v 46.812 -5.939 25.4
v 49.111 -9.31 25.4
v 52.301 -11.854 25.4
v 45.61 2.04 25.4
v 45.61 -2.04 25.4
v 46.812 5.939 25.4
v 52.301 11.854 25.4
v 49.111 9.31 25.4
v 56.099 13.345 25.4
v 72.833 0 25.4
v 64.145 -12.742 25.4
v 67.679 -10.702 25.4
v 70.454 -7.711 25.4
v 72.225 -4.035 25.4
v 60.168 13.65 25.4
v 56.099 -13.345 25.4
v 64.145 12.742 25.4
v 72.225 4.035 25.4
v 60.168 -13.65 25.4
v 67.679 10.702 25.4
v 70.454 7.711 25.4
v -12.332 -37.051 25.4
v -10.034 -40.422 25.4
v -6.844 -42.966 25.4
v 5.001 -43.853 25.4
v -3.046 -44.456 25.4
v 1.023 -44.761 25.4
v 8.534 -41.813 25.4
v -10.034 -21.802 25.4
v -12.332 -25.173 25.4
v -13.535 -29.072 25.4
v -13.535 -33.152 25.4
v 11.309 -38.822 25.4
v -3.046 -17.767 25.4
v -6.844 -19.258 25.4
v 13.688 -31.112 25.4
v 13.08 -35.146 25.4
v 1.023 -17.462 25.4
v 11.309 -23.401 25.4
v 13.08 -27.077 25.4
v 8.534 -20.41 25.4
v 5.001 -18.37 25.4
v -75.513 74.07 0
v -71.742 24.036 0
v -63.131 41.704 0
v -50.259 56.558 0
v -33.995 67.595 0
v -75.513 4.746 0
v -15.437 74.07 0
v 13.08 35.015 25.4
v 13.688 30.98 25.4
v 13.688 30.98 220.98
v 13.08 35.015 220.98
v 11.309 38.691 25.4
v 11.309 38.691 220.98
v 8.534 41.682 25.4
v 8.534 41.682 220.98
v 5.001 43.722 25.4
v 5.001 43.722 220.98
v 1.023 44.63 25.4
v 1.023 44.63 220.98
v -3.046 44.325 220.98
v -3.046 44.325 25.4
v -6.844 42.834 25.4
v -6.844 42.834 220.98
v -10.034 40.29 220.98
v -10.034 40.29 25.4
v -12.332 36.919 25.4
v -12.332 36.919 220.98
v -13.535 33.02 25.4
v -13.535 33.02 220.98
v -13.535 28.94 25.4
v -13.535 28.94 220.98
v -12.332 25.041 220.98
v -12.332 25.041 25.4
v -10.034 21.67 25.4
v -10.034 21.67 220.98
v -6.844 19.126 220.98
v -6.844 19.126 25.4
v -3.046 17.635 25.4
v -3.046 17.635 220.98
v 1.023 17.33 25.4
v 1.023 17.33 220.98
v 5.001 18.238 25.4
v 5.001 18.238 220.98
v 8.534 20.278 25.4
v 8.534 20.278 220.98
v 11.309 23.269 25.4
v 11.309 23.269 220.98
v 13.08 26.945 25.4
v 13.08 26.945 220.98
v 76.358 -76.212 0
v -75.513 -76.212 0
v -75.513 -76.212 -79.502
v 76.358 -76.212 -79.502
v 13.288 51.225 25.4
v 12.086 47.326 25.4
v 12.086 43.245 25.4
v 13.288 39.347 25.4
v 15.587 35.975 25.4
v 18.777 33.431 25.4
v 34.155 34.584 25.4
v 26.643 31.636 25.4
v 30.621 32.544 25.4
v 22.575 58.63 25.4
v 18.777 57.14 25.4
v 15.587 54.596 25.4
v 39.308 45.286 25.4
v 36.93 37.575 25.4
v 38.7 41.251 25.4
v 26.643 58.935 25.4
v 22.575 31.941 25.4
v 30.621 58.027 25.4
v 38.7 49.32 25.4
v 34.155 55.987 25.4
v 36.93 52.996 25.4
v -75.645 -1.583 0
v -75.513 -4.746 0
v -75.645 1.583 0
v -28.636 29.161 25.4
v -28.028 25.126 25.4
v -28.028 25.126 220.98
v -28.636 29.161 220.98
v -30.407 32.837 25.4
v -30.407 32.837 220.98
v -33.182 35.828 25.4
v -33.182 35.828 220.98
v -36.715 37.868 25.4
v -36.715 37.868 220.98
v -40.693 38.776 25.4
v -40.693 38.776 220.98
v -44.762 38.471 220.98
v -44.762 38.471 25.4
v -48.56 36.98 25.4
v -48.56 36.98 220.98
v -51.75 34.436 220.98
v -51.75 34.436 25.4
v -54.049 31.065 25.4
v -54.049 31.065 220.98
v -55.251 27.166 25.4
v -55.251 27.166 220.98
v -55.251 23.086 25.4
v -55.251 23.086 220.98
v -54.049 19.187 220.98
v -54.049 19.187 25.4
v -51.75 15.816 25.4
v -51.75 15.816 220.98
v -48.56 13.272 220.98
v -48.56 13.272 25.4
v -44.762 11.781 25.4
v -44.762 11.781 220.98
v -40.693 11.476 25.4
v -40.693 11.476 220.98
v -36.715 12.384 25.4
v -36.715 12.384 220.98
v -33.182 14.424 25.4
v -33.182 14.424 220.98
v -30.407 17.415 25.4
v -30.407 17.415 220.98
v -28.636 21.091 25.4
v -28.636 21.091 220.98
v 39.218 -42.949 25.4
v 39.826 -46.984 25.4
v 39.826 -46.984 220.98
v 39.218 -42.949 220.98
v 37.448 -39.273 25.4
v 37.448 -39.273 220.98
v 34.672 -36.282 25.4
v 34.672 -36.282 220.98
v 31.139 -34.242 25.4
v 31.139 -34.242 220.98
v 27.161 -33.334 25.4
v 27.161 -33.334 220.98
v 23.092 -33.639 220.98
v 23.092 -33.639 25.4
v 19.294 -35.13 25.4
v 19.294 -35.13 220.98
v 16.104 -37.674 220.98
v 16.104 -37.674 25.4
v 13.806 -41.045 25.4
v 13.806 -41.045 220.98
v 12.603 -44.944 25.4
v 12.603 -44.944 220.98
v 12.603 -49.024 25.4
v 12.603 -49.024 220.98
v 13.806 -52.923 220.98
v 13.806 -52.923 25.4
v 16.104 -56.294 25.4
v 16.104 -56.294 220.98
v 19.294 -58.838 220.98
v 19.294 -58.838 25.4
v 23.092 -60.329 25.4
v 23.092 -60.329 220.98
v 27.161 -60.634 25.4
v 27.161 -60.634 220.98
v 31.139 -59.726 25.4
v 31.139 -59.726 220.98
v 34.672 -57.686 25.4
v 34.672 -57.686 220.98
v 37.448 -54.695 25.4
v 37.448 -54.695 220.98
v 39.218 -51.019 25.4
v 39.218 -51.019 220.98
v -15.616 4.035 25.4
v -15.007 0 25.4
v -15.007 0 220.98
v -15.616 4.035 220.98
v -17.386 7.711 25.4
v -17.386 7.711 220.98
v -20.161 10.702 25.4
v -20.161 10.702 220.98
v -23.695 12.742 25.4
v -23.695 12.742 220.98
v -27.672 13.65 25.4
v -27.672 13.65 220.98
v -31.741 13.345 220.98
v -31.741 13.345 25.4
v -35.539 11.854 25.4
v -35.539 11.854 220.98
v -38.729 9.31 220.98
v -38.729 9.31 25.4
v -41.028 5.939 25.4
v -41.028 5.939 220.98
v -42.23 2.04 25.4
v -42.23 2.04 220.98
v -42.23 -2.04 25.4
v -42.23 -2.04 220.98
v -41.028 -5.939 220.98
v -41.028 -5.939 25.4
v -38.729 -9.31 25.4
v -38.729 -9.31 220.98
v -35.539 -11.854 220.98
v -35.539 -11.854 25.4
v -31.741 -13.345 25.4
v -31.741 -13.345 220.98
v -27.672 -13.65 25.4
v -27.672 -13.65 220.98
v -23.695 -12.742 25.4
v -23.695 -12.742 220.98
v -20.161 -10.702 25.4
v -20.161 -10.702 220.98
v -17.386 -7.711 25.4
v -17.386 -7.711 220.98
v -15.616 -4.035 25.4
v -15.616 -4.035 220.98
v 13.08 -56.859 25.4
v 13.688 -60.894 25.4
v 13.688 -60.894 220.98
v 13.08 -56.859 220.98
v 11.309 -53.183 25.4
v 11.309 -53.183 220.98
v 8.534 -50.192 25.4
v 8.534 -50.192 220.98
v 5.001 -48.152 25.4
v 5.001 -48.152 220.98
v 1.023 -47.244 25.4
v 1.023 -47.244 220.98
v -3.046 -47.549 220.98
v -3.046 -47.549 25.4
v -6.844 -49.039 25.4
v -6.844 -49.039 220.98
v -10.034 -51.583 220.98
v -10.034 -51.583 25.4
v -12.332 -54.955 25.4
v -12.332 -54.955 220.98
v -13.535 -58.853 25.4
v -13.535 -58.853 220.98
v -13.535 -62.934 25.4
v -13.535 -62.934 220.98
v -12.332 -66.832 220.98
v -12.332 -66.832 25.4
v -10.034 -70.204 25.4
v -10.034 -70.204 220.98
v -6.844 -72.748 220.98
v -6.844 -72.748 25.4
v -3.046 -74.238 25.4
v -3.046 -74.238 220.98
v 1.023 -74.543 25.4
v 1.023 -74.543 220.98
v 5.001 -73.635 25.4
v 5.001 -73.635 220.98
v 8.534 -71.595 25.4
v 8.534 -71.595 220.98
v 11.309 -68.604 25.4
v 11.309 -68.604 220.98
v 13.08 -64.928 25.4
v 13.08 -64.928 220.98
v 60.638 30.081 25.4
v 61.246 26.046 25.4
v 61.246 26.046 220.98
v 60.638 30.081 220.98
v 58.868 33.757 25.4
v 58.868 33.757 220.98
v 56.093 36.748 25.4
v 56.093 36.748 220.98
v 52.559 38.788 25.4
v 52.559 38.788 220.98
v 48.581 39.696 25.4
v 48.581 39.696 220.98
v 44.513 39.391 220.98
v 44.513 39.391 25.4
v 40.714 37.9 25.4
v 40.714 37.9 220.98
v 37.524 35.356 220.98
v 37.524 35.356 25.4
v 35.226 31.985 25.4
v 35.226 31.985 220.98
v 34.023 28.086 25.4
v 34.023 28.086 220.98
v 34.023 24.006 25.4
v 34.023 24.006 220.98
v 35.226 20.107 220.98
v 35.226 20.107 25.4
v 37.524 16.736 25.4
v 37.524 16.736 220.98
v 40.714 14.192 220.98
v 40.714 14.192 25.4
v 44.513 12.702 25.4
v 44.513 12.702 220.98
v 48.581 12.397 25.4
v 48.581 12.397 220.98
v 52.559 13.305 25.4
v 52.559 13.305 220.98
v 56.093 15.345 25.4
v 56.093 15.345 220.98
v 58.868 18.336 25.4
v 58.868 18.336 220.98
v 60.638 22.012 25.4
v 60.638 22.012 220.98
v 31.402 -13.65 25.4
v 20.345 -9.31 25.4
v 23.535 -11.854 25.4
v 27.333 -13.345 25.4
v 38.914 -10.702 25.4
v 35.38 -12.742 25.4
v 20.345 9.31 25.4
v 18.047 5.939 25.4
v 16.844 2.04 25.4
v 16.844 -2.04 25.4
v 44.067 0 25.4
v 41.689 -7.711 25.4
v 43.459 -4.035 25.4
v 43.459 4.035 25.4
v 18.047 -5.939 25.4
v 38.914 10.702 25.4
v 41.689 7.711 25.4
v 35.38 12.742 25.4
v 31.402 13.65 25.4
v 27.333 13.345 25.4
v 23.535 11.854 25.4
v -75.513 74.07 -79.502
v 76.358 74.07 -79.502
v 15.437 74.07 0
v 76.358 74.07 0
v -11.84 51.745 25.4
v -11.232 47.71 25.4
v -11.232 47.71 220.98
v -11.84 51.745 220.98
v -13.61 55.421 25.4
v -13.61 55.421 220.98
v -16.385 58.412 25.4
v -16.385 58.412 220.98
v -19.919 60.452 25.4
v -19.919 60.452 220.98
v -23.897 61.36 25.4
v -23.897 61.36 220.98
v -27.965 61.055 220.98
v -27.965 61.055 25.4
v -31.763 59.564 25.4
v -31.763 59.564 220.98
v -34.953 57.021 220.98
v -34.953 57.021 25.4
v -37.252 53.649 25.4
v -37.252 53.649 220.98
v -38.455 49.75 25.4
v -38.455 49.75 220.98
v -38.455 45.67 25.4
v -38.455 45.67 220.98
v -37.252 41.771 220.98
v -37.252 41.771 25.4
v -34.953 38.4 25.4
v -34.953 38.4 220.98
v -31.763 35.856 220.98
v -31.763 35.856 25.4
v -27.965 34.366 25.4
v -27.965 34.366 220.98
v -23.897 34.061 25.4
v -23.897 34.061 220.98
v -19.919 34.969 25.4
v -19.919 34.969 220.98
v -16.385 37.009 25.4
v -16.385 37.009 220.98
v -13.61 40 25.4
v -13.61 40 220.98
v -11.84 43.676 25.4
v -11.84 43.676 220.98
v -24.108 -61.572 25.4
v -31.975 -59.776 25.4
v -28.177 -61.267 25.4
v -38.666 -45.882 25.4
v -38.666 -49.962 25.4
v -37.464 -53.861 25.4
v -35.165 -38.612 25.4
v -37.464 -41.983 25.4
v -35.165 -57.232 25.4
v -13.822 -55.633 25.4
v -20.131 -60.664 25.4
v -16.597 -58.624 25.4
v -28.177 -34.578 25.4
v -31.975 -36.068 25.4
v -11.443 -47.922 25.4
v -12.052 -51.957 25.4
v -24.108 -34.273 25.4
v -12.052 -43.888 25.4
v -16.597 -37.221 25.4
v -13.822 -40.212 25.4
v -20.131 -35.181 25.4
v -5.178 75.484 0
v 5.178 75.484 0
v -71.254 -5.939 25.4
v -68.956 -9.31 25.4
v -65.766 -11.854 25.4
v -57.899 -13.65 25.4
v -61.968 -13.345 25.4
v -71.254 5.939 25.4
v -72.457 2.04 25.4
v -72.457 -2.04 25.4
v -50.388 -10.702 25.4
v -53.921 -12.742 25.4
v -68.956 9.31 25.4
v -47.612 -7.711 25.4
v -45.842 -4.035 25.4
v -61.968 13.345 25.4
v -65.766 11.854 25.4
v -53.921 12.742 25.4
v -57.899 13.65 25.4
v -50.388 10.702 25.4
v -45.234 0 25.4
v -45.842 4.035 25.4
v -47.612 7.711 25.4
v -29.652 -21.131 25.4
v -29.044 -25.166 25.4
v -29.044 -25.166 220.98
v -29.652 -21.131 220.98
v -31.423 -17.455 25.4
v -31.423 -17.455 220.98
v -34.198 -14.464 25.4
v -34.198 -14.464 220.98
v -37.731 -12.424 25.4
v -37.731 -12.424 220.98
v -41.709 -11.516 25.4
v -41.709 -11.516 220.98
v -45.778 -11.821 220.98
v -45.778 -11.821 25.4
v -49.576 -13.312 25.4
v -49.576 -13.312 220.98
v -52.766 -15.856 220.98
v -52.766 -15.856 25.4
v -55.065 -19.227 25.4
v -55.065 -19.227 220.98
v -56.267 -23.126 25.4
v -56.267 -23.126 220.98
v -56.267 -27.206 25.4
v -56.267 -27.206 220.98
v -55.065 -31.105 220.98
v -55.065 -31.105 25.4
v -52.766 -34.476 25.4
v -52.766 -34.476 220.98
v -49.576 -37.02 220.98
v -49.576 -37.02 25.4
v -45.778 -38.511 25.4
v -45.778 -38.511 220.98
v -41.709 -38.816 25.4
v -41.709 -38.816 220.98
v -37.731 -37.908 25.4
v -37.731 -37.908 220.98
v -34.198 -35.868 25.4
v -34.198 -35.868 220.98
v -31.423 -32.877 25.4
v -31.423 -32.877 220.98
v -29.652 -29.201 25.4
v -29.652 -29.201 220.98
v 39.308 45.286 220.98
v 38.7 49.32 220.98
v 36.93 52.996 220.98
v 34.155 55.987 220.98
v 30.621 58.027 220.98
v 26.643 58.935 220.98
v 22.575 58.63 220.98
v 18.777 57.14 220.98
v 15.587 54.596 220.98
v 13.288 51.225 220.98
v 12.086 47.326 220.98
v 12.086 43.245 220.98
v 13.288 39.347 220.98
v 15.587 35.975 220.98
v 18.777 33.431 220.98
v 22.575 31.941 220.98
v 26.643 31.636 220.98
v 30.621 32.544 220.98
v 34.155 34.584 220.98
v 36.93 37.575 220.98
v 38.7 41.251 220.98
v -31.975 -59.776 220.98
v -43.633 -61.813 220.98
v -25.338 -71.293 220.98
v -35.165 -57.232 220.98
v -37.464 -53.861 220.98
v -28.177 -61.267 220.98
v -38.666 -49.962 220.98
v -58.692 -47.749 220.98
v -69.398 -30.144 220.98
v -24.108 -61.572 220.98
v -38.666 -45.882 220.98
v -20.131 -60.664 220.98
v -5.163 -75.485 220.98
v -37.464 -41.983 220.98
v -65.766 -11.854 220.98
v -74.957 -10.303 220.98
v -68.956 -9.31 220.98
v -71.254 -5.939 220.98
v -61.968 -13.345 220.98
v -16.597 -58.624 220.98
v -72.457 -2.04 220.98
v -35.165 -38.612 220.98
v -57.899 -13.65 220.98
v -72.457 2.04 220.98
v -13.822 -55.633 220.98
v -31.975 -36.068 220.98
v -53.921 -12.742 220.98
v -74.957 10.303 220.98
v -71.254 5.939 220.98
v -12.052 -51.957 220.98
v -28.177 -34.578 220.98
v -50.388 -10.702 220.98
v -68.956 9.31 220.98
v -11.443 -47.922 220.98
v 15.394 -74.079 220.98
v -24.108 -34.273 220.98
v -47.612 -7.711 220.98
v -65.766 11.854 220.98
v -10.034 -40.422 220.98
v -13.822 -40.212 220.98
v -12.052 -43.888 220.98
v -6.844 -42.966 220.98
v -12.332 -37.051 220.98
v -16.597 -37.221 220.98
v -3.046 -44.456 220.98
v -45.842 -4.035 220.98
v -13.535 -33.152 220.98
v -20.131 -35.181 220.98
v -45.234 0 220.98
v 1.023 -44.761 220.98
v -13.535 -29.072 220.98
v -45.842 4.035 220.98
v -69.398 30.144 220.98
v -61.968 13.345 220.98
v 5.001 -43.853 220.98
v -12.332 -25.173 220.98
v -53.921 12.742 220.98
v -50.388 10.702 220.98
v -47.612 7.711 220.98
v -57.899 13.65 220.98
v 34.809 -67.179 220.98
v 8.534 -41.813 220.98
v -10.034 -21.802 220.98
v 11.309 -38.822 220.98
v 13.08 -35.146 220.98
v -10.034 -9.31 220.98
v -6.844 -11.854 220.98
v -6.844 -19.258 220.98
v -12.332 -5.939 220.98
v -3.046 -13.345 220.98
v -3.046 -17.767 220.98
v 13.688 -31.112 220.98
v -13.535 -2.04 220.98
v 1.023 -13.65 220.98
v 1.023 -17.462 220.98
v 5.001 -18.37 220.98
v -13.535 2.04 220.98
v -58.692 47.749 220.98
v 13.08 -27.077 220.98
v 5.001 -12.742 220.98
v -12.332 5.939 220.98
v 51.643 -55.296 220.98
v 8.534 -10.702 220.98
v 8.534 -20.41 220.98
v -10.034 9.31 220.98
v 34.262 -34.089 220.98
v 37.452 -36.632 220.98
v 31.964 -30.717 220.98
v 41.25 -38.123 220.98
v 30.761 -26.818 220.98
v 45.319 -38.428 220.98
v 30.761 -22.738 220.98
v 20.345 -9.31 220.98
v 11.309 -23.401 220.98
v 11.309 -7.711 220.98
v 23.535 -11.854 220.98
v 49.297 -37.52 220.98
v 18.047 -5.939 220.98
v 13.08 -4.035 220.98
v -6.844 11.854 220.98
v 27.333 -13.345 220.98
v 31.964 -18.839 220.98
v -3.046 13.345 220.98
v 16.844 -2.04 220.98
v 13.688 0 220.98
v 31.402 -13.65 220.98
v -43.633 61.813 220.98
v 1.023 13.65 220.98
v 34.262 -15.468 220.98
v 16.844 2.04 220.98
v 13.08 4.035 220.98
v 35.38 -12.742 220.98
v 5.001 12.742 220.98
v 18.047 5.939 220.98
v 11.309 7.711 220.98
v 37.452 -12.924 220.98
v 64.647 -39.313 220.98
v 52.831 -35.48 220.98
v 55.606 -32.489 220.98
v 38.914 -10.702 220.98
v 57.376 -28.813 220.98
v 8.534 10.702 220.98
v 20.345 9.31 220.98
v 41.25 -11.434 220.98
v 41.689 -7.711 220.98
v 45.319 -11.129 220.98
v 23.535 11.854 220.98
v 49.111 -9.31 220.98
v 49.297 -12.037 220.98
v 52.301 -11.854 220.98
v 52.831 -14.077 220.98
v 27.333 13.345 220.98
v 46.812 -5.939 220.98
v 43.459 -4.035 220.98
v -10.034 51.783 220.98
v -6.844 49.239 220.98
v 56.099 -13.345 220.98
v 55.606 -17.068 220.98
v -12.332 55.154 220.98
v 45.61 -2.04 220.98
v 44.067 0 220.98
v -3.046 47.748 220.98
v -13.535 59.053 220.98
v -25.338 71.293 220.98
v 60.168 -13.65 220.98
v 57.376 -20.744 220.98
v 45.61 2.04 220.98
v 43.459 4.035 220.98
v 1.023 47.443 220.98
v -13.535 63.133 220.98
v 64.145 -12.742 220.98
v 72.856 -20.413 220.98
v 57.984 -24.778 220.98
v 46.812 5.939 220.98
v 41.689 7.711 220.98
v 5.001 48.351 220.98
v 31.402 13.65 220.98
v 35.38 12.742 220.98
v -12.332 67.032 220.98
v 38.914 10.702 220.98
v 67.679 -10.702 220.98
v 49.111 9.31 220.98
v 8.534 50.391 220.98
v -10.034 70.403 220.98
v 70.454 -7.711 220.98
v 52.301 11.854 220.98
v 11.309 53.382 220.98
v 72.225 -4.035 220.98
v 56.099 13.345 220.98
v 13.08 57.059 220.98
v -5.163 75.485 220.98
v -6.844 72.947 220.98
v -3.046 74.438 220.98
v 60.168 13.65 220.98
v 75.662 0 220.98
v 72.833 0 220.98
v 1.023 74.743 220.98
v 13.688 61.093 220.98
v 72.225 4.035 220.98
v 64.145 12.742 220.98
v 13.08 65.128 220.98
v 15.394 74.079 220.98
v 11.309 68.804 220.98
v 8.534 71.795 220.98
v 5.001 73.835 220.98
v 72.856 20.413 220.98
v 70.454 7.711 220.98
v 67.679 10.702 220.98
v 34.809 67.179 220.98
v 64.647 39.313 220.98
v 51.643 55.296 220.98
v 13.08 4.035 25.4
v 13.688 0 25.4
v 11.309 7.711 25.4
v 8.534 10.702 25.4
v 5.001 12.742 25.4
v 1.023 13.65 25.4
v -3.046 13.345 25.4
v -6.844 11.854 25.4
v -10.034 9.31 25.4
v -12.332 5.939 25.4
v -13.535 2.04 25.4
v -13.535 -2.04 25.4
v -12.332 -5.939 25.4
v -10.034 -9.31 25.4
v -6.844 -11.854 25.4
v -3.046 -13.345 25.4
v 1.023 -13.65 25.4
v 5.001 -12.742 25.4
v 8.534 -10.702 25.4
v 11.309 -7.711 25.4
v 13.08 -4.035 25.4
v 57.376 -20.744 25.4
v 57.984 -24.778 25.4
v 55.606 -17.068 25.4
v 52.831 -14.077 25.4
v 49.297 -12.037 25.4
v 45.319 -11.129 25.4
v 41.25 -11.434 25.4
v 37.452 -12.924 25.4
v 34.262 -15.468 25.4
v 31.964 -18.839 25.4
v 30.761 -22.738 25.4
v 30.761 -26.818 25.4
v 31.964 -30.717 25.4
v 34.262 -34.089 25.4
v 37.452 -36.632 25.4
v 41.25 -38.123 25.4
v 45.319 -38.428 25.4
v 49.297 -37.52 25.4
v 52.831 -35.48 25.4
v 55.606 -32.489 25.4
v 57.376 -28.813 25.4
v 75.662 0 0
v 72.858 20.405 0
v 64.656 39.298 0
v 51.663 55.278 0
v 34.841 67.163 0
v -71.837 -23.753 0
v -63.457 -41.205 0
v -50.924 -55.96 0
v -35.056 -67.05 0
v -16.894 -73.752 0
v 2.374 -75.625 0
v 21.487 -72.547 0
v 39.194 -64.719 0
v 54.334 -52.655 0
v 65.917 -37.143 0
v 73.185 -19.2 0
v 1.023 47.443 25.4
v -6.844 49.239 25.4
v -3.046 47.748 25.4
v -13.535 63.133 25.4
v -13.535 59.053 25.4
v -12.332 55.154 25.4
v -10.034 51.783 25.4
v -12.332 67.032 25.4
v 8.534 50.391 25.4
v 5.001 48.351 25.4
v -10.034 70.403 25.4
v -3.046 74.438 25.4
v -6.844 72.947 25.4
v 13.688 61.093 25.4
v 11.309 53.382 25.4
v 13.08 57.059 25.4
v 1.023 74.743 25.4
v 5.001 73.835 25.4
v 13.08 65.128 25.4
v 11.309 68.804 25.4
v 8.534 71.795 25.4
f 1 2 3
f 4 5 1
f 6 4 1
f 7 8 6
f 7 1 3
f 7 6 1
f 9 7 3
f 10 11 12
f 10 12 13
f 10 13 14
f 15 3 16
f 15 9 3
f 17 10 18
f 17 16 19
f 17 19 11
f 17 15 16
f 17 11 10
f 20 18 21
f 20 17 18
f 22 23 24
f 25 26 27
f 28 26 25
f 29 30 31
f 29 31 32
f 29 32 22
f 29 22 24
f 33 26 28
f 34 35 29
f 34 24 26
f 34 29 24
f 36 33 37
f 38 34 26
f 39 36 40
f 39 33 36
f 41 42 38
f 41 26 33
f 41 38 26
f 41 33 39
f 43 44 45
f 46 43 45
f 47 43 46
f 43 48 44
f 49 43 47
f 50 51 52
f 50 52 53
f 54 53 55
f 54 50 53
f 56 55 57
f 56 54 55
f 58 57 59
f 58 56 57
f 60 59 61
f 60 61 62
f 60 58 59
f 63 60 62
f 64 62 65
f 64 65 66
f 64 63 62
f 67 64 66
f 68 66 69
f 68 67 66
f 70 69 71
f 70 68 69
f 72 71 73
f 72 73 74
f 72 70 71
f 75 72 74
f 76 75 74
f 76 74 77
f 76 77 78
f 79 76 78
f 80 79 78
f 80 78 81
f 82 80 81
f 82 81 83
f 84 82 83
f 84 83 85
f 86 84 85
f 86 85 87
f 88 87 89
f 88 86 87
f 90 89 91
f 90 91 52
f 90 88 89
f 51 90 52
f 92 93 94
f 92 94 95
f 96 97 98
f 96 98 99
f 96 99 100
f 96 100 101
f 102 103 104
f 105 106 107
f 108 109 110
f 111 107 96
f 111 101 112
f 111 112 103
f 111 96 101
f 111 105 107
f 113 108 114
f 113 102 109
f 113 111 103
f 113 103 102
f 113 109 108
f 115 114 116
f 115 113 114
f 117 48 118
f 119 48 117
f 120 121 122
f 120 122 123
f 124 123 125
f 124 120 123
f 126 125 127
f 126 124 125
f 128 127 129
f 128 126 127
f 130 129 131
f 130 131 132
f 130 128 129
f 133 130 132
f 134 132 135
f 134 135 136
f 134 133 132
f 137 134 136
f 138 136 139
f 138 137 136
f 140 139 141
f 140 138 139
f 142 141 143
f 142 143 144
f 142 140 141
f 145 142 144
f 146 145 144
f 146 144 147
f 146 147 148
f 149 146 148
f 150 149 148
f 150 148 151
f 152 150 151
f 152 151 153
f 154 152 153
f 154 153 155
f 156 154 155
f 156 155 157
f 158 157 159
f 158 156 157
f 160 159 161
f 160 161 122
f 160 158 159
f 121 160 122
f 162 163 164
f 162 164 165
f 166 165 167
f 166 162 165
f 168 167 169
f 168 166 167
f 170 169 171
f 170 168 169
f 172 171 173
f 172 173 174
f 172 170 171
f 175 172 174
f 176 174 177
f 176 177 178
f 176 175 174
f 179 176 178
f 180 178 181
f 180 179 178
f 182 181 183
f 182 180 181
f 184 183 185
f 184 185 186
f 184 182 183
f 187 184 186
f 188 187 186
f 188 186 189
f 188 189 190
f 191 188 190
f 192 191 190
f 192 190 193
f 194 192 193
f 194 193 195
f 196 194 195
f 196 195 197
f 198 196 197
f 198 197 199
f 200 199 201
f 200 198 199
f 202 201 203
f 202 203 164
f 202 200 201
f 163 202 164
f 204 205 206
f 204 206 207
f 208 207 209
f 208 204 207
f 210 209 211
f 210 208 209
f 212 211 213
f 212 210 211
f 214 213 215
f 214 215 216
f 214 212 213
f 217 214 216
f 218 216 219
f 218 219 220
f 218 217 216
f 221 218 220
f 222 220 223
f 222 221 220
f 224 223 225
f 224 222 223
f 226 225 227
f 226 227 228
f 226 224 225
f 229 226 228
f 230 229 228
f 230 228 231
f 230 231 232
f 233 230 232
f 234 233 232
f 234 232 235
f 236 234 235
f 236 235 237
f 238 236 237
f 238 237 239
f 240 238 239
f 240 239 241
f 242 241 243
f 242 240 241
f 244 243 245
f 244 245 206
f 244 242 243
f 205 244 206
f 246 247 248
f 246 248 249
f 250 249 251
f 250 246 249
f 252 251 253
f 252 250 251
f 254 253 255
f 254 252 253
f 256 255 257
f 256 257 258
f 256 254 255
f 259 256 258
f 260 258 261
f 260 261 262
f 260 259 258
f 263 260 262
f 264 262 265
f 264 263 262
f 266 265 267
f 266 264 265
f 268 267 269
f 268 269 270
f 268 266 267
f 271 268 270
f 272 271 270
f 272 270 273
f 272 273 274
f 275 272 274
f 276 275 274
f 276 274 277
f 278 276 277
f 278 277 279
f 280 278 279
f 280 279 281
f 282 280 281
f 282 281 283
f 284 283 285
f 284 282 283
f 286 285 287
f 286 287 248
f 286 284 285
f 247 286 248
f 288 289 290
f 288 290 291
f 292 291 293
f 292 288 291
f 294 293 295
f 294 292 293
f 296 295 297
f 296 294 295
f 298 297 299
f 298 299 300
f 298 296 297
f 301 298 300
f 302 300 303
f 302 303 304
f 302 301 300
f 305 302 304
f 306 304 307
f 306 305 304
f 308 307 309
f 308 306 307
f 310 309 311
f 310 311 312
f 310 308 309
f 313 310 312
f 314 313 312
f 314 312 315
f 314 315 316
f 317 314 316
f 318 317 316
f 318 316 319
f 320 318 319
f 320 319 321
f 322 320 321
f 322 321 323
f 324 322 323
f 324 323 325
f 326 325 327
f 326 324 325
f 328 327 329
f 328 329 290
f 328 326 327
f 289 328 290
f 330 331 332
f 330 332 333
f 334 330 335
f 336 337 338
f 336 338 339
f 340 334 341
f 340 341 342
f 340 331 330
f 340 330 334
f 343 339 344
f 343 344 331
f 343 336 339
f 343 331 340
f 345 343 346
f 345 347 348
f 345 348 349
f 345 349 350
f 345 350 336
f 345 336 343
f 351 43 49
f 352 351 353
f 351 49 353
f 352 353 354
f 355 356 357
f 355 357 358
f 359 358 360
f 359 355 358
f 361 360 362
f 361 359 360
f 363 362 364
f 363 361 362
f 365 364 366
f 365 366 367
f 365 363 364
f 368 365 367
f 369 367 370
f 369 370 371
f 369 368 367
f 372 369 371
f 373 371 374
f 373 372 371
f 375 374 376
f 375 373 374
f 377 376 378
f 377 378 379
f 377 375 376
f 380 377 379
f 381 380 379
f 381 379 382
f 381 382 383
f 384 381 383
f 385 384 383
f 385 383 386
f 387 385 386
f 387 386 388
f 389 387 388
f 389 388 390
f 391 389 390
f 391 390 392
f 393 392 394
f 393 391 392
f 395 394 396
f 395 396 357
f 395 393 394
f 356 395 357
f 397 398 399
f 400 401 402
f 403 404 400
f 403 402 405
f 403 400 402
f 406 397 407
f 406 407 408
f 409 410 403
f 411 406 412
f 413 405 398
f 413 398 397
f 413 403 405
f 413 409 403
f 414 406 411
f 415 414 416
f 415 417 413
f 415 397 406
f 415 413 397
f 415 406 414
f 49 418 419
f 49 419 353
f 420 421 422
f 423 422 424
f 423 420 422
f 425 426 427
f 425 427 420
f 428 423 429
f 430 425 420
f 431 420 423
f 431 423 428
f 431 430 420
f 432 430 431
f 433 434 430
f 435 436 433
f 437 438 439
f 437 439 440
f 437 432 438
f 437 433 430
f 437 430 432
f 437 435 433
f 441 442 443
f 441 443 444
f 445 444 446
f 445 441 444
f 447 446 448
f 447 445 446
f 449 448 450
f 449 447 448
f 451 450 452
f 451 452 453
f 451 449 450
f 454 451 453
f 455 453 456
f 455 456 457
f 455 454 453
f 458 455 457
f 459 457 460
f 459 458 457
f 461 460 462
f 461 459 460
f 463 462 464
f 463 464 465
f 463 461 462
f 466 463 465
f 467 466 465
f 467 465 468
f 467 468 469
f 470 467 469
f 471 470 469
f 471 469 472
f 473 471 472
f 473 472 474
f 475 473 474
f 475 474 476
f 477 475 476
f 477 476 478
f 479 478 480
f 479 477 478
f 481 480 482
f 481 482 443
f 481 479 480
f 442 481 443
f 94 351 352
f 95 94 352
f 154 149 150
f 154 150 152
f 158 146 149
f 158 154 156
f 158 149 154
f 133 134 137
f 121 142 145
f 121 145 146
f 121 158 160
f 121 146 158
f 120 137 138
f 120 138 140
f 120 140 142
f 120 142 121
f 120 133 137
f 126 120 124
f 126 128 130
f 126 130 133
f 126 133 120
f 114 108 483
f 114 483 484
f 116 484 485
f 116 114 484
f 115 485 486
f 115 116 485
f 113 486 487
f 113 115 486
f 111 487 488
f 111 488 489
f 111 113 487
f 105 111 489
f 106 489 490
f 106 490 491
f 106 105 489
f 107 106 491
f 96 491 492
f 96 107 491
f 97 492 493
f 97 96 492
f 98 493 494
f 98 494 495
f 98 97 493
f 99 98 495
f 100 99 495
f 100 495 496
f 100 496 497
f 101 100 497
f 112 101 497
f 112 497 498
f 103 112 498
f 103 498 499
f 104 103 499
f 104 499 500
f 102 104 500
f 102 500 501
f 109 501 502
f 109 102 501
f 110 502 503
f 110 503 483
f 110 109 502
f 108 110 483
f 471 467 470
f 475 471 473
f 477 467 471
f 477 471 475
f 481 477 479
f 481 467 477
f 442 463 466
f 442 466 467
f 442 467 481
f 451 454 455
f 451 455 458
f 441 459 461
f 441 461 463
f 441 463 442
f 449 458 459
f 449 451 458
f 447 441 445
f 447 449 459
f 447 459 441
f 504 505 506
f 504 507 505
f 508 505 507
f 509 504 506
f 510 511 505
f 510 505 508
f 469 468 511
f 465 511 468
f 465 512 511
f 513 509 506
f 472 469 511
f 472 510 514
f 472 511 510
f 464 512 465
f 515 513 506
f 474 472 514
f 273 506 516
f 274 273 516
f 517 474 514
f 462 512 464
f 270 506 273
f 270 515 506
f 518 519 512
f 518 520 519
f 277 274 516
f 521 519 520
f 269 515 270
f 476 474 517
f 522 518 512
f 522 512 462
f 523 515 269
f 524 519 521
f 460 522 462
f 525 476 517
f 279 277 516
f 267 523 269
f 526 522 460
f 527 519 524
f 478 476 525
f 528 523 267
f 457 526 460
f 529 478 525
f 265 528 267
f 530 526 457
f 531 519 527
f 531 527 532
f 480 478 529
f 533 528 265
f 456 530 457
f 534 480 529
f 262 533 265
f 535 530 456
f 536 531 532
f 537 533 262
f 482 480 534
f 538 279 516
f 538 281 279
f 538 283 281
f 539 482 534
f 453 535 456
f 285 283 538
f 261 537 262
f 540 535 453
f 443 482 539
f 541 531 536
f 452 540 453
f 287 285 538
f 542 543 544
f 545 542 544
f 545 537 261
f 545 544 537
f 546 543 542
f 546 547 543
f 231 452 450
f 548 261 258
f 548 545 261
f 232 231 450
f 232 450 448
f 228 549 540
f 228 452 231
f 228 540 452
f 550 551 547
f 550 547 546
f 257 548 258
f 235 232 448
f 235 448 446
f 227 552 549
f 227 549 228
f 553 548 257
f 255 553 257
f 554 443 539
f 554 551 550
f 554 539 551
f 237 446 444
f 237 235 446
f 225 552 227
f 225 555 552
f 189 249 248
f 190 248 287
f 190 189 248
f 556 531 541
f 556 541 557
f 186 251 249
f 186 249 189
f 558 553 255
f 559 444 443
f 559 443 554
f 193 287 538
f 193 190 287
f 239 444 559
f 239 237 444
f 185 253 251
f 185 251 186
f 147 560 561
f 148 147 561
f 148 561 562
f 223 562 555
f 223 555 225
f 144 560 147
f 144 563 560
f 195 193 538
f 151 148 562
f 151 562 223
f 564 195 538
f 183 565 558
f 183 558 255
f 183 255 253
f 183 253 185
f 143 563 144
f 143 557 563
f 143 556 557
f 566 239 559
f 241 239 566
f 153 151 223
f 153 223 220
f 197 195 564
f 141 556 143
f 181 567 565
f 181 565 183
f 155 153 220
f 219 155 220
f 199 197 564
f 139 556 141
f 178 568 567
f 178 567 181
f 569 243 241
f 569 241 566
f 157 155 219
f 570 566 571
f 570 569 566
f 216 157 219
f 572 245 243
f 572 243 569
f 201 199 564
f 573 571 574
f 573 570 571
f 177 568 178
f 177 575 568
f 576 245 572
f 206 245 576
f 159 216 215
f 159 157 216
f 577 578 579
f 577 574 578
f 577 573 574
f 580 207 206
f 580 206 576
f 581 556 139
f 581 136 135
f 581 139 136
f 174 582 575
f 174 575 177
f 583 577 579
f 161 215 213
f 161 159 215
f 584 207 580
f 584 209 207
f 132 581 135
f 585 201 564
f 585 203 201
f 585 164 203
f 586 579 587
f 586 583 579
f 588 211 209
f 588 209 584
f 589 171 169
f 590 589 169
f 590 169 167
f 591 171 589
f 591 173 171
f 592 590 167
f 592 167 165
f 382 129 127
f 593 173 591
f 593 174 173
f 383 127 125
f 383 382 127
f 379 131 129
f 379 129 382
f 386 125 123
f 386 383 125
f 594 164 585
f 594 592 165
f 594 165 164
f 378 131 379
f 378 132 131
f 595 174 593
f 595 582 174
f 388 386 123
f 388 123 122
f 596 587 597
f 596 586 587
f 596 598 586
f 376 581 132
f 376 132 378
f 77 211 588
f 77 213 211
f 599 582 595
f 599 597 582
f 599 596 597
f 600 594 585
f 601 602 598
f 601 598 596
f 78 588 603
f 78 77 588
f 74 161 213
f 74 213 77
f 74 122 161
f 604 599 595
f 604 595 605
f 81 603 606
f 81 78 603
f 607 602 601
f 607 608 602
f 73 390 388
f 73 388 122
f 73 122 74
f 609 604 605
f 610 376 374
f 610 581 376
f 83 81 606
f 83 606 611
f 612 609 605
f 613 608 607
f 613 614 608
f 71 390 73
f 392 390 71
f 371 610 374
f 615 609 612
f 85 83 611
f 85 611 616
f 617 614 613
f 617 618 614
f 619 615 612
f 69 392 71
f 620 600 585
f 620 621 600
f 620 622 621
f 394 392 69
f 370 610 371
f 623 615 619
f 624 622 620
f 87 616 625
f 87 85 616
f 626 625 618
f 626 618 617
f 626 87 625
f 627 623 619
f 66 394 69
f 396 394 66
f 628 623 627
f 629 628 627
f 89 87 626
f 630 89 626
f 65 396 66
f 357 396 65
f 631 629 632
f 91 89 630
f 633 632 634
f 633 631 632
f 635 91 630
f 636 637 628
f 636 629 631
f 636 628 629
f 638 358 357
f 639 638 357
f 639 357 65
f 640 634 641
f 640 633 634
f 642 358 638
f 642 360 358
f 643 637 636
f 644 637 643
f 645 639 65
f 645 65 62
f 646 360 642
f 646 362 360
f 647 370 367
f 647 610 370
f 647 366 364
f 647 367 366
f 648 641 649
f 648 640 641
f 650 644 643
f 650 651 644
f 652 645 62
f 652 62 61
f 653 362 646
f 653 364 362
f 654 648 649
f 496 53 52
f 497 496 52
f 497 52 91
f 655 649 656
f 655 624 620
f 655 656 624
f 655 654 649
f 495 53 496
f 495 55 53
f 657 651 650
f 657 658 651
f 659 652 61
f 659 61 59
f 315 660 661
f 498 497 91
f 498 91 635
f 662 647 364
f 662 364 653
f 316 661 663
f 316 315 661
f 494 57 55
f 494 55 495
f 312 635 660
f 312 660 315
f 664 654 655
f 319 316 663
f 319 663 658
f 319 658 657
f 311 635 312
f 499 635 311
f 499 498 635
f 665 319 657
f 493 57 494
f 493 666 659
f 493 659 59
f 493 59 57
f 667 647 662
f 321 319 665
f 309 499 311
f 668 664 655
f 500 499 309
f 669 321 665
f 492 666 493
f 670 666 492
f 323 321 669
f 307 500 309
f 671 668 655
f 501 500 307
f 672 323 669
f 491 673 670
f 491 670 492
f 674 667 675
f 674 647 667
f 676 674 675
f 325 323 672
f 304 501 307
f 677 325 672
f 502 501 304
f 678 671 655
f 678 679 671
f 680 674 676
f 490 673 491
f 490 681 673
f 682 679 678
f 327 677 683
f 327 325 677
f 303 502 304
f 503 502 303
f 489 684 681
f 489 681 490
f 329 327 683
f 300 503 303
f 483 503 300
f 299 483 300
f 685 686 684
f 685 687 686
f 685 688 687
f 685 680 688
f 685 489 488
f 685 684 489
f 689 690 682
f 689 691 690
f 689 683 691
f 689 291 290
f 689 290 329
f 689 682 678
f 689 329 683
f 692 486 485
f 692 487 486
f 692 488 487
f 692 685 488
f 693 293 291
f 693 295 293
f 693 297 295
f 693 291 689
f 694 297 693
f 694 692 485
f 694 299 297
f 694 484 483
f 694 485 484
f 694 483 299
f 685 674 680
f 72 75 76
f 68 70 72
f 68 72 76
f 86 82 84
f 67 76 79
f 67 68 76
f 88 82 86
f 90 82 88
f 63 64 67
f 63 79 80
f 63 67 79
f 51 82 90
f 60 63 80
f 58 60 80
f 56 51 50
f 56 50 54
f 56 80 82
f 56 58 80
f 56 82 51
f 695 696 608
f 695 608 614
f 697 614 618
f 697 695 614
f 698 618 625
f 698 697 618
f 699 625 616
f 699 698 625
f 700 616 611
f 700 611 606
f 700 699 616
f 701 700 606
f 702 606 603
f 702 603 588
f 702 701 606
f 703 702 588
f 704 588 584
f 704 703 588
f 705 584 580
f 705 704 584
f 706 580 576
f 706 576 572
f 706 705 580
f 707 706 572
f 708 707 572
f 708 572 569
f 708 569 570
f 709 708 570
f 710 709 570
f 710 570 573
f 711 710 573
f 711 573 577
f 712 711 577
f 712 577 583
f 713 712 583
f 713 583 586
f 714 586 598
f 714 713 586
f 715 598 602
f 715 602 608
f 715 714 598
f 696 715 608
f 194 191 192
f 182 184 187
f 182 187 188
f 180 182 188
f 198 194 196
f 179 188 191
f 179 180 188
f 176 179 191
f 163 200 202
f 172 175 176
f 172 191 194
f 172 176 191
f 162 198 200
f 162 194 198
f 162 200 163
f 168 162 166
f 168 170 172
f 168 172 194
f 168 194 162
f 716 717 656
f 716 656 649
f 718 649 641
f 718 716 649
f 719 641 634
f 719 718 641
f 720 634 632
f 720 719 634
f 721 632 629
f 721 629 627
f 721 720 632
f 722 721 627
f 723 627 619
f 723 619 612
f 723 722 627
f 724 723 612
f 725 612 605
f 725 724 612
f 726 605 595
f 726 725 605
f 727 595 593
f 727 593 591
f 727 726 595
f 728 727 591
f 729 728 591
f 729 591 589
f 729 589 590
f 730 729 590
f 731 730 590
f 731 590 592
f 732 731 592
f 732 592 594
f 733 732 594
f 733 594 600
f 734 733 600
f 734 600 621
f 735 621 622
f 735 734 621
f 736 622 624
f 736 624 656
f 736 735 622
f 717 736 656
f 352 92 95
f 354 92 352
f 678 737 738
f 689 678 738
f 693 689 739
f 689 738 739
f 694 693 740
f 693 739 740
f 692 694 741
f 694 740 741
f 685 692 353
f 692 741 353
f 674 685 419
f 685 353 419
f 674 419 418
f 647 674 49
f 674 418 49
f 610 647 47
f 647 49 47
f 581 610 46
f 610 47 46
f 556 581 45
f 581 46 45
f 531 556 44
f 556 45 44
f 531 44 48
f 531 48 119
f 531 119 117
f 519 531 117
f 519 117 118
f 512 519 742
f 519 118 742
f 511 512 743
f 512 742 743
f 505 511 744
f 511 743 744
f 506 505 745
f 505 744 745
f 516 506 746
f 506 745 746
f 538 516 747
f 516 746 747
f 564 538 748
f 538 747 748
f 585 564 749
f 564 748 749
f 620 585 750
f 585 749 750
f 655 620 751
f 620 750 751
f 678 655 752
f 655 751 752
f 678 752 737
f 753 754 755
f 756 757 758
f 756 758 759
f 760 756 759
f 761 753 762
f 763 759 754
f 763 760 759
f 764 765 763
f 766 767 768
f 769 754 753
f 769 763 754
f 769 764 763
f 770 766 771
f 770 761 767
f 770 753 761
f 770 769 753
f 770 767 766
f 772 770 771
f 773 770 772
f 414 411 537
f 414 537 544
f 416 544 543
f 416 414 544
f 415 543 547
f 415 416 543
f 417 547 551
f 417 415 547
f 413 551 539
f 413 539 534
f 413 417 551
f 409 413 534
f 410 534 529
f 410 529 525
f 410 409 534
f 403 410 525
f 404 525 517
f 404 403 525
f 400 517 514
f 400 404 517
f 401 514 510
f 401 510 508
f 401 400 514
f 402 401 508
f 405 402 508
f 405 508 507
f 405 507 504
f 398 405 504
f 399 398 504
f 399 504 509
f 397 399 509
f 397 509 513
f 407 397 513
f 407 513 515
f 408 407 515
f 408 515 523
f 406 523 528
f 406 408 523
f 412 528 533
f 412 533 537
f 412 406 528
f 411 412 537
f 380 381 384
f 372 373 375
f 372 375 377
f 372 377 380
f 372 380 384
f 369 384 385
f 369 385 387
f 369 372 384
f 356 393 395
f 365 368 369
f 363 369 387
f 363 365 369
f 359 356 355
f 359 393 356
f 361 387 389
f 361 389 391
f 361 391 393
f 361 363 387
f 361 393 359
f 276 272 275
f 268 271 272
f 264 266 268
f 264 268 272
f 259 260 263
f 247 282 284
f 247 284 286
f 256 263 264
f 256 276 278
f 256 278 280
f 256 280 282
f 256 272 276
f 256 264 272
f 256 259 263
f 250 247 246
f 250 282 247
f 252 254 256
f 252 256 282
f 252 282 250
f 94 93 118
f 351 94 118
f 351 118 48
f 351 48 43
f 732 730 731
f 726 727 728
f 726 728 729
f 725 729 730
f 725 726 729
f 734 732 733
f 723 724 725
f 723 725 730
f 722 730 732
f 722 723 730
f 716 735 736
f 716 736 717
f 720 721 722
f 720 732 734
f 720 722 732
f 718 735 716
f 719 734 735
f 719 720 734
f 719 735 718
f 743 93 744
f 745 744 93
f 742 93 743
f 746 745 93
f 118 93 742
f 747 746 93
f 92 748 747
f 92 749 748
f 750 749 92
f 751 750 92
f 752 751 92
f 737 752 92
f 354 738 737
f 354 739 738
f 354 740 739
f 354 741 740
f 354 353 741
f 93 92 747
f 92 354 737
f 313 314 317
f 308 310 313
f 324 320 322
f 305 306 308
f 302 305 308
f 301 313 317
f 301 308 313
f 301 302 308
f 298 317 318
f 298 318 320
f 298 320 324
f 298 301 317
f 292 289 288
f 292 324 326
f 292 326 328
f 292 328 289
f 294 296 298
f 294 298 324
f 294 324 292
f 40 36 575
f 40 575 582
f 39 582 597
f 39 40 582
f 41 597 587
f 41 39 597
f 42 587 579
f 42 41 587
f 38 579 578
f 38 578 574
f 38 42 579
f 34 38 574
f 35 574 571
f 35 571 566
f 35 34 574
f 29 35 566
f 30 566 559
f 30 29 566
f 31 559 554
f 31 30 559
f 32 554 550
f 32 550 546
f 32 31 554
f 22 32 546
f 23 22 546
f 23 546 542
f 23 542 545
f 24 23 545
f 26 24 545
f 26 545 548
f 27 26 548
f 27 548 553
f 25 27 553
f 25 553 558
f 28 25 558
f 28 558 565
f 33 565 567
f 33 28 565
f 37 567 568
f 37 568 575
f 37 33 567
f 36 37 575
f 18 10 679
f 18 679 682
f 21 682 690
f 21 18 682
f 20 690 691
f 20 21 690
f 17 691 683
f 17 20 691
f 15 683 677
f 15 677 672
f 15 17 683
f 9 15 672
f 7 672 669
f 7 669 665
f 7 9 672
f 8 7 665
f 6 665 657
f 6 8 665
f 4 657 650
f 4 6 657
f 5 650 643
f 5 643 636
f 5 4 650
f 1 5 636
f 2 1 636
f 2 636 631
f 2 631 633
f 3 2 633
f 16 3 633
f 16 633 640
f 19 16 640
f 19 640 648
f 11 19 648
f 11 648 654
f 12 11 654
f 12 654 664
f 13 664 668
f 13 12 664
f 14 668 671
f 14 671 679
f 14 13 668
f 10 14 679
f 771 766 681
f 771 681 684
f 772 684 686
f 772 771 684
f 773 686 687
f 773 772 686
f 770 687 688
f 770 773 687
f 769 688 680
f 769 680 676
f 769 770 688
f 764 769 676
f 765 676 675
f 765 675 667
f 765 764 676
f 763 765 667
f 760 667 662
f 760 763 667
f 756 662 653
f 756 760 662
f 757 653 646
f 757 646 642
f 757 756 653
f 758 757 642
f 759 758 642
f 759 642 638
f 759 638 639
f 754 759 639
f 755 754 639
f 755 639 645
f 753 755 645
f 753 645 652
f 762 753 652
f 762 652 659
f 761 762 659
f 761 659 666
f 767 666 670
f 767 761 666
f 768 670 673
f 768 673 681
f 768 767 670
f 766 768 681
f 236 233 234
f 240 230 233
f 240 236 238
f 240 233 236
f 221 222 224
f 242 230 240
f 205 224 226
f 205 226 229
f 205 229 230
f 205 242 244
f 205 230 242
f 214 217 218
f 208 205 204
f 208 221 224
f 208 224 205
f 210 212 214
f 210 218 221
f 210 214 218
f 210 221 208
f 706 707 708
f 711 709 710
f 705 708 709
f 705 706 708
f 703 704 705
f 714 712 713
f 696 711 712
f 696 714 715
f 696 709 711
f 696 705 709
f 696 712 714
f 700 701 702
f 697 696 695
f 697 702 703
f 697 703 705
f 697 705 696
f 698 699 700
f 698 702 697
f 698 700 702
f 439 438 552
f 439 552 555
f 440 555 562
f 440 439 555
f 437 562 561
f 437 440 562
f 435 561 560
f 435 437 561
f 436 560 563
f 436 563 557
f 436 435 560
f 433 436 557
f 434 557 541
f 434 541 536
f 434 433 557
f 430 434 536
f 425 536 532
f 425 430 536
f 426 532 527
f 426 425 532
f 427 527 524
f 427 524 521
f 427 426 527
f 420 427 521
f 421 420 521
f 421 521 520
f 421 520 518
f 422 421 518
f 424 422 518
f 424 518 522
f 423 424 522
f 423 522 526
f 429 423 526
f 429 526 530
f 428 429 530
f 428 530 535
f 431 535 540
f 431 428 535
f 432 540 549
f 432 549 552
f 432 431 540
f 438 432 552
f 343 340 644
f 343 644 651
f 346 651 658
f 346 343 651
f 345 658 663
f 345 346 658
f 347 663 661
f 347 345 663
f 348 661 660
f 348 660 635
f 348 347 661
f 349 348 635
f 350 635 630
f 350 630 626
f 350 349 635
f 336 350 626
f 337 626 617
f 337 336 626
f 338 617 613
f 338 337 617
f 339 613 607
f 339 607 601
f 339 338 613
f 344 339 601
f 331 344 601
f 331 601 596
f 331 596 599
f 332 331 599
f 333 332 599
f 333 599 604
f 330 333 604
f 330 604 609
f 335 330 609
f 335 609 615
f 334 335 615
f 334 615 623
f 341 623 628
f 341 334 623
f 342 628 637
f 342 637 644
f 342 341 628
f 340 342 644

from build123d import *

# Parameters (mm, degrees)
F0_R     = 75.661837
F1_DEPTH = 25.4
F2_R     = 75.661837
F2_R_2   = 13.687901
F3_DEPTH = 195.58
F4_W     = 151.870482
F4_H     = 150.282562
F5_DEPTH = 79.502


with BuildPart() as f1:
    # F0 (on Top) → F1 (new body)
    with BuildSketch(Plane.XY):
        Circle(F0_R)
    extrude(amount=F1_DEPTH)

    # F2 (on face) → F3 (join)
    with BuildSketch(Plane.XY.offset(25.4)):
        Circle(F2_R)
        with Locations((-25.131308, -47.922332)):
            Circle(F2_R_2, mode=Mode.SUBTRACT)
        with Locations((-42.732153, -25.166063)):
            Circle(F2_R_2, mode=Mode.SUBTRACT)
        with Locations((0, -60.893506)):
            Circle(F2_R_2, mode=Mode.SUBTRACT)
        with Locations((26.138142, -46.983935)):
            Circle(F2_R_2, mode=Mode.SUBTRACT)
        with Locations((0, -31.111687)):
            Circle(F2_R_2, mode=Mode.SUBTRACT)
        with Locations((44.296265, -24.778374)):
            Circle(F2_R_2, mode=Mode.SUBTRACT)
        with Locations((-58.921885, 0)):
            Circle(F2_R_2, mode=Mode.SUBTRACT)
        with Locations((-41.716155, 25.125945)):
            Circle(F2_R_2, mode=Mode.SUBTRACT)
        with Locations((-28.695317, 0)):
            Circle(F2_R_2, mode=Mode.SUBTRACT)
        with Locations((-24.919521, 47.710422)):
            Circle(F2_R_2, mode=Mode.SUBTRACT)
        Circle(F2_R_2, mode=Mode.SUBTRACT)
        with Locations((30.379288, 0)):
            Circle(F2_R_2, mode=Mode.SUBTRACT)
        with Locations((0, 30.979946)):
            Circle(F2_R_2, mode=Mode.SUBTRACT)
        with Locations((59.144725, 0)):
            Circle(F2_R_2, mode=Mode.SUBTRACT)
        with Locations((47.558412, 26.046298)):
            Circle(F2_R_2, mode=Mode.SUBTRACT)
        with Locations((25.620574, 45.285549)):
            Circle(F2_R_2, mode=Mode.SUBTRACT)
        with Locations((0, 61.093103)):
            Circle(F2_R_2, mode=Mode.SUBTRACT)
    extrude(amount=F3_DEPTH)

    # F4 (on Top) → F5 (join)
    with BuildSketch(Plane.XY):
        with Locations((0.422429, -1.071021)):
            Rectangle(F4_W, F4_H)
    extrude(amount=-F5_DEPTH)


solid = f1.part
